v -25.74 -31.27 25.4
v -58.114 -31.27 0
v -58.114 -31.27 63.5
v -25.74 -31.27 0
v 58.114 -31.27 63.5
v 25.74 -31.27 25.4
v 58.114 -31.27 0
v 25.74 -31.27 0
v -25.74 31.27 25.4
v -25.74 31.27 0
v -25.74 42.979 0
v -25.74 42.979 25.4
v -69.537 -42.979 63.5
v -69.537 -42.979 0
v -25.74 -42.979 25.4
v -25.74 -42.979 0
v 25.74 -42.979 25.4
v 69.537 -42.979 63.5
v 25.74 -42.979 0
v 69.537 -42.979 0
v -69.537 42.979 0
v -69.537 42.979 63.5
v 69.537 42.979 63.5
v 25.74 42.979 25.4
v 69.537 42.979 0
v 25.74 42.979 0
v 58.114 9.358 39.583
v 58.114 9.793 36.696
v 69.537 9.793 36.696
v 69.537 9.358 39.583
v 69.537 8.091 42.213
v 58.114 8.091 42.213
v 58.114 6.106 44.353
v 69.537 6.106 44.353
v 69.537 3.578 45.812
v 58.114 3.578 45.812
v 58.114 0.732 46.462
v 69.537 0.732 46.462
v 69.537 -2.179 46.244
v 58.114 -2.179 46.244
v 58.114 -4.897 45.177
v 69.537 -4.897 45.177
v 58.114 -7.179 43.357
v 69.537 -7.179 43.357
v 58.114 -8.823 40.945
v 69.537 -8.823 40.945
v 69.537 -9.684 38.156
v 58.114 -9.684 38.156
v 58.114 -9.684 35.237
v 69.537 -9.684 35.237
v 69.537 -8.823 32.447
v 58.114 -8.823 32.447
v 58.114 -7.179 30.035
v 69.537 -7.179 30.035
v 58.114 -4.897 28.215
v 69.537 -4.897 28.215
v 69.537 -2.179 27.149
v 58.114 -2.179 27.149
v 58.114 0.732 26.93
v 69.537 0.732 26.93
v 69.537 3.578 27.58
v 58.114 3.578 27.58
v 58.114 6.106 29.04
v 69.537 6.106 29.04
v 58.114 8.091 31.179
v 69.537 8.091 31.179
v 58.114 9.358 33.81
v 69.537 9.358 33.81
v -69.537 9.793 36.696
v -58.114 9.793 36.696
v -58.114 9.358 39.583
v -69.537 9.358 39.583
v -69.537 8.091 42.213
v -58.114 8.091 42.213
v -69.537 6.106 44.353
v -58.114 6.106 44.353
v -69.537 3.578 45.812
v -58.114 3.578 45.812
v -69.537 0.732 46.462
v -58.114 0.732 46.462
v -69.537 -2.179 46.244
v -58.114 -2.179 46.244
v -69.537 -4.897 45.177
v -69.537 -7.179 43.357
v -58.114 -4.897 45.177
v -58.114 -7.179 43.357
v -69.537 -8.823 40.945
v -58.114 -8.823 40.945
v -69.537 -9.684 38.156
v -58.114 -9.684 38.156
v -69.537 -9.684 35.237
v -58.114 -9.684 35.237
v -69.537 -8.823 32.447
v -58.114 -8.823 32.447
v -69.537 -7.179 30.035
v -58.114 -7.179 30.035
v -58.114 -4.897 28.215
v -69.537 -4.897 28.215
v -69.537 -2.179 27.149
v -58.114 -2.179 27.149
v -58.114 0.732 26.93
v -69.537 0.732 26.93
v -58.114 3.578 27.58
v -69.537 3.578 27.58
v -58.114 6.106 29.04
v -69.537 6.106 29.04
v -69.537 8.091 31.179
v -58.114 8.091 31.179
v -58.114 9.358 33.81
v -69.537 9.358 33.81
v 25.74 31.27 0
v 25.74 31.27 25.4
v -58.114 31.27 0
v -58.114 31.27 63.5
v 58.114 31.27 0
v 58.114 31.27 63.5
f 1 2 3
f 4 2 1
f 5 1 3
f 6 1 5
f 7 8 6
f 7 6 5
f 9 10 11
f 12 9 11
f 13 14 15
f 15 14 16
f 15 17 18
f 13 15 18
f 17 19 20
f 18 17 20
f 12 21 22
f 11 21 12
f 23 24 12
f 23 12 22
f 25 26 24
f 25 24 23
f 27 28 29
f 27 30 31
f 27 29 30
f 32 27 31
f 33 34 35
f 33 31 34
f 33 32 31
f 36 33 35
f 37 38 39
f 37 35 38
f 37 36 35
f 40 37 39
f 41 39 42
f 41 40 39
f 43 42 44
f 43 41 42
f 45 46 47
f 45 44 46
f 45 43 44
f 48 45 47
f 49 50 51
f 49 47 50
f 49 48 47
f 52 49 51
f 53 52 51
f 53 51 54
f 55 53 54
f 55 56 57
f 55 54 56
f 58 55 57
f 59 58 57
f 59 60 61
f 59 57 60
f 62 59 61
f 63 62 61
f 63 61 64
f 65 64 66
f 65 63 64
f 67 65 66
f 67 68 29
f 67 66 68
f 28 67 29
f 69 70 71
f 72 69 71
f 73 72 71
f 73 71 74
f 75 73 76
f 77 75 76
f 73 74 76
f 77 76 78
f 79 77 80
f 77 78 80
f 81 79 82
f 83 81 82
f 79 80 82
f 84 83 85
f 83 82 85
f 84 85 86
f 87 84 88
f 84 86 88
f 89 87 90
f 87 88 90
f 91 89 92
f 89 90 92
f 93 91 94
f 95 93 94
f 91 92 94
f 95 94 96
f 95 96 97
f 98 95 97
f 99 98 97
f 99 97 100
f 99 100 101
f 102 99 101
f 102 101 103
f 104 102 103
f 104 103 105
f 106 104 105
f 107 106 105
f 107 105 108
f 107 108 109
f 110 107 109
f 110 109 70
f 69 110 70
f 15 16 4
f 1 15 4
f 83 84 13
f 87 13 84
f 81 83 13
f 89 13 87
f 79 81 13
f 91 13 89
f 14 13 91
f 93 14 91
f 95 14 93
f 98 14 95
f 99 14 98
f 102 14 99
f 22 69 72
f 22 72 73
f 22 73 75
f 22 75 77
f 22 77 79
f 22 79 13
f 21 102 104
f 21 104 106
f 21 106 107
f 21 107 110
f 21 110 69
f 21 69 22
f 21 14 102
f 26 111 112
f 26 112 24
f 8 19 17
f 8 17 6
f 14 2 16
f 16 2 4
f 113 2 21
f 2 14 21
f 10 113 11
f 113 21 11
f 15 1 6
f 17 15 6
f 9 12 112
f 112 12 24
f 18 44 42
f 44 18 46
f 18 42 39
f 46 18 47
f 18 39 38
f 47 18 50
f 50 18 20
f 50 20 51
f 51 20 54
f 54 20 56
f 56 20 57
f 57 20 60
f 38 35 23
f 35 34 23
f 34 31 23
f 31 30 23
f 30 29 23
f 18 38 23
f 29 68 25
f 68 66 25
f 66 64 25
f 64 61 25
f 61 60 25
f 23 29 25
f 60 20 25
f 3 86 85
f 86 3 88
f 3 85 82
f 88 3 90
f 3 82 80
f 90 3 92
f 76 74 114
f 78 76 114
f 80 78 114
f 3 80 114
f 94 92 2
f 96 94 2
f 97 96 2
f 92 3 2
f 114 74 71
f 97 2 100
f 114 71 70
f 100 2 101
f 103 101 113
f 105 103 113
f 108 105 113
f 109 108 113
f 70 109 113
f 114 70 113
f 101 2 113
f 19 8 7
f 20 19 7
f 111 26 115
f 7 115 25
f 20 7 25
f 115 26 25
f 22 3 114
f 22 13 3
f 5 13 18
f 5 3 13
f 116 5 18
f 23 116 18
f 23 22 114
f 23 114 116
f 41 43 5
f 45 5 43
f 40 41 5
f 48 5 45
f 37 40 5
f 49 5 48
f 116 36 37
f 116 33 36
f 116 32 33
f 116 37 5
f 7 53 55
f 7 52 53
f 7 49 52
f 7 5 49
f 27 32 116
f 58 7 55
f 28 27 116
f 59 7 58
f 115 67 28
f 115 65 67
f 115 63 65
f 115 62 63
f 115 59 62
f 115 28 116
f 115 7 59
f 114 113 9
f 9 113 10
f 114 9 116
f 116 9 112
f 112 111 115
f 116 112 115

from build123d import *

# Parameters (mm, degrees)
F0_W     = 139.073908329
F0_H     = 85.957378149
F0_W_2   = 116.2280887365
F0_H_2   = 62.5404193997
F1_DEPTH = 63.5
F2_W     = 51.4795817435
F2_H     = 101.4539152384
F3_DEPTH = 25.4
F4_DEPTH = 25.4
F5_R     = 9.7930895965
F6_DEPTH = 69.5379541645


# Not quite as in the source:
# - a pattern or mirror of a feature is missing from the dataset's text; its kind, count and spacing are read off the source's solid


with BuildPart() as f1:
    # F0 (on Top) → F1 (new body)
    with BuildSketch(Plane.XY):
        Rectangle(F0_W, F0_H)
        Rectangle(F0_W_2, F0_H_2, mode=Mode.SUBTRACT)
    extrude(amount=F1_DEPTH)

    # F2 (on Top) → F3 (join)
    with BuildSketch(Plane.XY):
        Rectangle(F2_W, F2_H)
    extrude(amount=F3_DEPTH)

    # F2 (on Top) → F4 (cut)
    with BuildSketch(Plane.XY):
        Rectangle(F2_W, F2_H)
    extrude(amount=F4_DEPTH, mode=Mode.SUBTRACT)

    # F5 (on Right) → F6 (cut, through all)
    with BuildSketch(Plane.YZ):
        with Locations((0, 36.6961322725)):
            Circle(F5_R)
    f6 = extrude(amount=-F6_DEPTH, mode=Mode.SUBTRACT)

    # F6_copies: F6 across plane
    add(f6.mirror(Plane(origin=(0, 0, 0), x_dir=(0, 0, 1), z_dir=(1, 0, 0))), mode=Mode.SUBTRACT)


solid = f1.part
